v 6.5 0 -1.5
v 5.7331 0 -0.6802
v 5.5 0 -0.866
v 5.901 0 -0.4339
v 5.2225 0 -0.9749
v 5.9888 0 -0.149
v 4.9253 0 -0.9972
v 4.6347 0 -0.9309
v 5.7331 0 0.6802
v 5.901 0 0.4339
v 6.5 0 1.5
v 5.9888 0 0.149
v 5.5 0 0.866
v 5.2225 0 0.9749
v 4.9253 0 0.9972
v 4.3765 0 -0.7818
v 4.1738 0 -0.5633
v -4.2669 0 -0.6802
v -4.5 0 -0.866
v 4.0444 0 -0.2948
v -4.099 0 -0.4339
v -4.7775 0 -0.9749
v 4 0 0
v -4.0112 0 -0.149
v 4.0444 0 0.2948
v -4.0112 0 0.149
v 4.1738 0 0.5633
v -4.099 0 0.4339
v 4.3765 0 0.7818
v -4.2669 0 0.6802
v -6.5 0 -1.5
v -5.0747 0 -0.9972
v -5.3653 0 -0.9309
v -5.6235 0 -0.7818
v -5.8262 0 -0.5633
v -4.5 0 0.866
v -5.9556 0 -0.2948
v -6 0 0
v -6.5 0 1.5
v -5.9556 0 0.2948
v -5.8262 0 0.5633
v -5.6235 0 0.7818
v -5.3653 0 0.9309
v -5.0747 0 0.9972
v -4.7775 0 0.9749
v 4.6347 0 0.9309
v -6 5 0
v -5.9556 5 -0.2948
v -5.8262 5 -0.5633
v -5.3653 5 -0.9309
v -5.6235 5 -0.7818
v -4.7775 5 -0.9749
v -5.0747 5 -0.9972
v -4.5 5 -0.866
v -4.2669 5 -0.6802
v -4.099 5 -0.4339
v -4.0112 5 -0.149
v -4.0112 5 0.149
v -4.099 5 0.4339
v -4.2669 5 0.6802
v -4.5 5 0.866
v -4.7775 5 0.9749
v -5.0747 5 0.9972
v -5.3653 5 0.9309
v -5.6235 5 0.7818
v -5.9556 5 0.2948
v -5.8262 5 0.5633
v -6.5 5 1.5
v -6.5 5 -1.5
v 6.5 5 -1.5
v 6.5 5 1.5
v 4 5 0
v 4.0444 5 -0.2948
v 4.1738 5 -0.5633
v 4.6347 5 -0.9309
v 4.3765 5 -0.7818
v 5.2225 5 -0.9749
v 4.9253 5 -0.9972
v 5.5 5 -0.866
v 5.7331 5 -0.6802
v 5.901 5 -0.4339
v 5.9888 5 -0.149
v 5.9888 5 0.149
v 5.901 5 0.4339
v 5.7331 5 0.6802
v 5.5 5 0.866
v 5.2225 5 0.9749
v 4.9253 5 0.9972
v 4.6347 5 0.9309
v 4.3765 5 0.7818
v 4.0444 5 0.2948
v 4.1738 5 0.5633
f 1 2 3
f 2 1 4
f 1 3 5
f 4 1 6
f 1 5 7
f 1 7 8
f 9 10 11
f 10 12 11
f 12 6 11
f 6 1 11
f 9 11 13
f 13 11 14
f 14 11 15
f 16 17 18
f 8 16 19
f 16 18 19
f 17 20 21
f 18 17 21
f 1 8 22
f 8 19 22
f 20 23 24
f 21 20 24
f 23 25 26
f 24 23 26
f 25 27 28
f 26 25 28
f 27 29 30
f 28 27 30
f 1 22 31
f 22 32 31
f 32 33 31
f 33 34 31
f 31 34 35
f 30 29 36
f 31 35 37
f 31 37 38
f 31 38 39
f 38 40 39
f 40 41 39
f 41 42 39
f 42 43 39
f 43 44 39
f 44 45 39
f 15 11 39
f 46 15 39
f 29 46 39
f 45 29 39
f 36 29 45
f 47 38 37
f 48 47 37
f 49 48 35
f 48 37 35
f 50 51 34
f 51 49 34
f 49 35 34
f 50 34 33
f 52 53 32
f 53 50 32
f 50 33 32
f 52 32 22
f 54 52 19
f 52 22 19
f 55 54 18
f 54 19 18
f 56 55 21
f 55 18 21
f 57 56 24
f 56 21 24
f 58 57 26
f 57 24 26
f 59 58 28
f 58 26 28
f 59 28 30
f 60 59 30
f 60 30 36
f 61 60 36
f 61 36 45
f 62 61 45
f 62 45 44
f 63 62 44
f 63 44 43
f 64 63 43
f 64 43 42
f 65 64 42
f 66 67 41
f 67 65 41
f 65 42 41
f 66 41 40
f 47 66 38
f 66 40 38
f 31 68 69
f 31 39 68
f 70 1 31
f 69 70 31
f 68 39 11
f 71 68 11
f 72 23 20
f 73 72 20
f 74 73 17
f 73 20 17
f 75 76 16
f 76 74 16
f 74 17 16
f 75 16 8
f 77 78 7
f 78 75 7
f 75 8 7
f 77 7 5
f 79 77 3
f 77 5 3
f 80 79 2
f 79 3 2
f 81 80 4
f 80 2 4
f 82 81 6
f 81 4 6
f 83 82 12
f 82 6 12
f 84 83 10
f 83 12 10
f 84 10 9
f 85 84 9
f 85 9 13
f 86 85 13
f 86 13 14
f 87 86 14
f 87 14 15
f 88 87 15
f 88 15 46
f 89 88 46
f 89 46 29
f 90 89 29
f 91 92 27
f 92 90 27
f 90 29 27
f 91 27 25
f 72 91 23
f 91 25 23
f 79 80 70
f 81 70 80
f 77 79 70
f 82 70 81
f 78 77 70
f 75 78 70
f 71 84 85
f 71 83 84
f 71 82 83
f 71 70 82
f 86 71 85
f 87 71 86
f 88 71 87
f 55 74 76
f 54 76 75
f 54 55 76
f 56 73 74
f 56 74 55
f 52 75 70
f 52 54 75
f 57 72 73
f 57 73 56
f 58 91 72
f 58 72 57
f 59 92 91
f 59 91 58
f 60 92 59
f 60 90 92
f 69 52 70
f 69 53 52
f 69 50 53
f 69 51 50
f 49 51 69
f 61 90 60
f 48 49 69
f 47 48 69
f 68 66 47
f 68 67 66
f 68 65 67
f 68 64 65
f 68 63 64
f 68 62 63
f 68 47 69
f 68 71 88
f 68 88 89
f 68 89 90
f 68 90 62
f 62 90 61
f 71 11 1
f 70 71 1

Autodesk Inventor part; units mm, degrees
ref_plane "YZ Plane" through (0, 0, 0) normal (1, 0, 0) x (0, 1, 0)
ref_plane "XZ Plane" through (0, 0, 0) normal (0, 1, 0) x (-1, 0, 0)
ref_plane "XY Plane" through (0, 0, 0) normal (0, 0, 1) x (1, 0, 0)
sketch "Sketch1" plane through (0, 0, 0) normal (0, 1, 0) x (-1, 0, 0)
  line L0 (-6.5, -1.5) -> (6.5, -1.5)
  line L1 (6.5, 3.5) -> (6.5, 3.5)
  line L2 (6.5, 1.5) -> (-6.5, 1.5)
  line L3 (-6.5, 3.5) -> (-6.5, 3.5)
  line L4 (-6.5, -1.5) -> (6.5, 1.5) construction
  line L5 (6.5, -1.5) -> (-6.5, 1.5) construction
  circle A0 centre (5, 0) radius 1
  line L6 (-6.5, 1.5) -> (-6.5, -1.5)
  line L7 (6.5, 1.5) -> (6.5, -1.5)
  line L8 (-6.5, 1.5) -> (-7.5, 1.5)
  circle A1 centre (-5, 0) radius 1
  point P0 (0, 0)
  dimension "d0" = 3
  dimension "d1" = 13
  dimension "d3" = 2
  dimension "d6" = 1.5
  dimension "d8" = 1.5
  dimension "d21" = 2
  dimension "d22" = 1.5
  dimension "d23" = 1.5
extrude "Extrusion1" add sketch "Sketch1" along normal blind 5
properties part number "link"
